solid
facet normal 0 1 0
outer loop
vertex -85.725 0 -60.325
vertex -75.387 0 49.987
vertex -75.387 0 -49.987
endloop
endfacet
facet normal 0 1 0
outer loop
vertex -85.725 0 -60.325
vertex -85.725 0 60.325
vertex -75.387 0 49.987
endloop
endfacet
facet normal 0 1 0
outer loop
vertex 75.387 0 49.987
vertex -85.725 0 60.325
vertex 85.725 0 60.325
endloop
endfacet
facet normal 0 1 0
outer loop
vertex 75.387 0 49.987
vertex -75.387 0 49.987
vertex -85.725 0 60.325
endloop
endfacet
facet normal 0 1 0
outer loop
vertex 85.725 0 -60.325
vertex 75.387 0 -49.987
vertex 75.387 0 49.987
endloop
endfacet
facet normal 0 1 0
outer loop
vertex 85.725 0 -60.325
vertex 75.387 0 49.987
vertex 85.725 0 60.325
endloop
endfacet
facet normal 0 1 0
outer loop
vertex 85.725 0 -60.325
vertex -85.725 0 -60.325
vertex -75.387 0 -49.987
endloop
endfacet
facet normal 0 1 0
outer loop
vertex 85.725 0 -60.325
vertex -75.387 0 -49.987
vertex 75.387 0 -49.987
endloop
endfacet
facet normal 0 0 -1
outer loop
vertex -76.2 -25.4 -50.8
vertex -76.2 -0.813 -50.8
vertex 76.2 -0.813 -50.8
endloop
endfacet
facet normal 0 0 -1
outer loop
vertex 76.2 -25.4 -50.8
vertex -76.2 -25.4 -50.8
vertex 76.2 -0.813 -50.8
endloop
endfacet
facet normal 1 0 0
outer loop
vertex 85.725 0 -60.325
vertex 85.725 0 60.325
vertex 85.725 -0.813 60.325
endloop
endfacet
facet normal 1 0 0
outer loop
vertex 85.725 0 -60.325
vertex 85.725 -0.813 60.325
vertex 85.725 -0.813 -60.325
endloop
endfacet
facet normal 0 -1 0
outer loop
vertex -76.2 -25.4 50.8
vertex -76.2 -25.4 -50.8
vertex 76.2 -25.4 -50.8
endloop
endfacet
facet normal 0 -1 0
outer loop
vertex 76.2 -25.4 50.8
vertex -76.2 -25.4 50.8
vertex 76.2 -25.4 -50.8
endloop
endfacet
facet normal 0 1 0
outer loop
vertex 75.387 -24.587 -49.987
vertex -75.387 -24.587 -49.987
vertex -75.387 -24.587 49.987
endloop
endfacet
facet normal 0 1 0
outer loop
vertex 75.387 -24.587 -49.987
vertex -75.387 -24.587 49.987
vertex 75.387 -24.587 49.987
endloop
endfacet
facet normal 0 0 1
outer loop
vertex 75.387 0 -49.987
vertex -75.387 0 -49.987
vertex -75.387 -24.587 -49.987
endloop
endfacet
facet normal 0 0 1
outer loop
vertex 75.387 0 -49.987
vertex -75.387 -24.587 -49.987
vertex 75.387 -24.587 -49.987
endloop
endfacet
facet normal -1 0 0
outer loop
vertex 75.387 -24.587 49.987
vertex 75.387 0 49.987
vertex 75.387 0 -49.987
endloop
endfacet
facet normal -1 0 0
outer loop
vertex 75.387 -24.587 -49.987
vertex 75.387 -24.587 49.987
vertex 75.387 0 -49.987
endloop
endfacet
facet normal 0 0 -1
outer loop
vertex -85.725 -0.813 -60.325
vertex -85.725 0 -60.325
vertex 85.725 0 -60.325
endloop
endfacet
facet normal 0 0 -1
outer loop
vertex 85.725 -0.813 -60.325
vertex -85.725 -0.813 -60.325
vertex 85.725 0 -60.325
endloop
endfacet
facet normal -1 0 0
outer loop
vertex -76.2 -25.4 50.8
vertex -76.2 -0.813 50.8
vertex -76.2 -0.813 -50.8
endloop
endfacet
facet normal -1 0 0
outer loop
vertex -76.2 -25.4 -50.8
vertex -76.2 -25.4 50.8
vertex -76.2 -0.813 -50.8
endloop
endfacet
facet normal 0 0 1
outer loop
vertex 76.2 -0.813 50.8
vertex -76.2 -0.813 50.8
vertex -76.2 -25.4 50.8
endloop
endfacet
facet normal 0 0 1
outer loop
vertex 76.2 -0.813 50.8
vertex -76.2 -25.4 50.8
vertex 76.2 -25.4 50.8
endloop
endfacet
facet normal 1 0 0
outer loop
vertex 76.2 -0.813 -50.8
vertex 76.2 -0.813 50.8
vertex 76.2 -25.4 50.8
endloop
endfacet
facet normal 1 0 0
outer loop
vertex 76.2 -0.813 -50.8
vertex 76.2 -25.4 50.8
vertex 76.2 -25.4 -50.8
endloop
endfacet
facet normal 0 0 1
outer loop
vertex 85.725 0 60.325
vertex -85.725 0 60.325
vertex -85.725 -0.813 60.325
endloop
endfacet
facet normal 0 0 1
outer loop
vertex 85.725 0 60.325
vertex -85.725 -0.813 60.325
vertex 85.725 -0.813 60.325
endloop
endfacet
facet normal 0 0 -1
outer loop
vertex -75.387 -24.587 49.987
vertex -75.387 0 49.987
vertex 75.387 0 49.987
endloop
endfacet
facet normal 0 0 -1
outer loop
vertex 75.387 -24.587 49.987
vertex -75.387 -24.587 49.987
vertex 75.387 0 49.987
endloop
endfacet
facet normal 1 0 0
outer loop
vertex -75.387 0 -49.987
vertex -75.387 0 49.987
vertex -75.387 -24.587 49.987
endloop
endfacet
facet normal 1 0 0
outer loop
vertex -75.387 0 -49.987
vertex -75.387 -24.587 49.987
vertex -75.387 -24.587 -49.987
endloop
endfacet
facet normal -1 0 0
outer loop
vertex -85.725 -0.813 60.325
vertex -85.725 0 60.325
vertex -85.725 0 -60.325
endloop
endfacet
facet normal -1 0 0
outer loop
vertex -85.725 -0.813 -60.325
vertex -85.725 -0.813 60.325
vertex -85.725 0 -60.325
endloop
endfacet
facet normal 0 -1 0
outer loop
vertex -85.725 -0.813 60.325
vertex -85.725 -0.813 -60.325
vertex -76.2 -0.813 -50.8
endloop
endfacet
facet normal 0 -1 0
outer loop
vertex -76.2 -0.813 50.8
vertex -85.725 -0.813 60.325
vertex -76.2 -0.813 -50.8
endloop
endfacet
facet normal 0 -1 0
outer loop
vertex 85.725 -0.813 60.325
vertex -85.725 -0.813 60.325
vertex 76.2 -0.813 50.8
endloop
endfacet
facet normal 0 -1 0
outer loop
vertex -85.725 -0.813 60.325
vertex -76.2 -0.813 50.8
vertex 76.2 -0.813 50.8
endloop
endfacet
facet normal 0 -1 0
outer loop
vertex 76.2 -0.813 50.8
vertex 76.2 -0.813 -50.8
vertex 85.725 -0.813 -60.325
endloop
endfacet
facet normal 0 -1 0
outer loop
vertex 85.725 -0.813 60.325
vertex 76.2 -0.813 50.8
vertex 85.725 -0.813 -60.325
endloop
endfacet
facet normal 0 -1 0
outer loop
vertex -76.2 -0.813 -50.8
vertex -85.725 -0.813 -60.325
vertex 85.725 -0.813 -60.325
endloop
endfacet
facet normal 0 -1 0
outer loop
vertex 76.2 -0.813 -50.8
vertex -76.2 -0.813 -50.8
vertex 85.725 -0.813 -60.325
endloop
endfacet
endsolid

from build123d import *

# Parameters (mm, degrees)
SKETCH1_W           = 152.4
SKETCH1_H           = 101.6
BOSS_EXTRUDE1_DEPTH = 25.4
SHELL1_T            = -0.8128
SKETCH3_W           = 171.45
SKETCH3_H           = 120.65
SKETCH3_W_2         = 152.4
SKETCH3_H_2         = 101.6
BOSS_EXTRUDE2_DEPTH = 0.8128


with BuildPart() as part:
    # Sketch1 → Boss-Extrude1 (new body)
    with BuildSketch(Plane(origin=(0, 0, 0), x_dir=(1, 0, 0), z_dir=(0, 1, 0))):
        Rectangle(SKETCH1_W, SKETCH1_H)
    extrude(amount=-BOSS_EXTRUDE1_DEPTH)

    # Shell1
    shell1_openings = [part.faces().sort_by_distance(p)[0] for p in [
        (0, 0, 0),
    ]]
    offset(amount=SHELL1_T, openings=shell1_openings, kind=Kind.INTERSECTION)

    # Sketch3 → Boss-Extrude2 (add)
    with BuildSketch(Plane(origin=(0, 0, 0), x_dir=(1, 0, 0), z_dir=(0, 1, 0))):
        Rectangle(SKETCH3_W, SKETCH3_H)
        Rectangle(SKETCH3_W_2, SKETCH3_H_2, mode=Mode.SUBTRACT)
    extrude(amount=-BOSS_EXTRUDE2_DEPTH)


solid = part.part
